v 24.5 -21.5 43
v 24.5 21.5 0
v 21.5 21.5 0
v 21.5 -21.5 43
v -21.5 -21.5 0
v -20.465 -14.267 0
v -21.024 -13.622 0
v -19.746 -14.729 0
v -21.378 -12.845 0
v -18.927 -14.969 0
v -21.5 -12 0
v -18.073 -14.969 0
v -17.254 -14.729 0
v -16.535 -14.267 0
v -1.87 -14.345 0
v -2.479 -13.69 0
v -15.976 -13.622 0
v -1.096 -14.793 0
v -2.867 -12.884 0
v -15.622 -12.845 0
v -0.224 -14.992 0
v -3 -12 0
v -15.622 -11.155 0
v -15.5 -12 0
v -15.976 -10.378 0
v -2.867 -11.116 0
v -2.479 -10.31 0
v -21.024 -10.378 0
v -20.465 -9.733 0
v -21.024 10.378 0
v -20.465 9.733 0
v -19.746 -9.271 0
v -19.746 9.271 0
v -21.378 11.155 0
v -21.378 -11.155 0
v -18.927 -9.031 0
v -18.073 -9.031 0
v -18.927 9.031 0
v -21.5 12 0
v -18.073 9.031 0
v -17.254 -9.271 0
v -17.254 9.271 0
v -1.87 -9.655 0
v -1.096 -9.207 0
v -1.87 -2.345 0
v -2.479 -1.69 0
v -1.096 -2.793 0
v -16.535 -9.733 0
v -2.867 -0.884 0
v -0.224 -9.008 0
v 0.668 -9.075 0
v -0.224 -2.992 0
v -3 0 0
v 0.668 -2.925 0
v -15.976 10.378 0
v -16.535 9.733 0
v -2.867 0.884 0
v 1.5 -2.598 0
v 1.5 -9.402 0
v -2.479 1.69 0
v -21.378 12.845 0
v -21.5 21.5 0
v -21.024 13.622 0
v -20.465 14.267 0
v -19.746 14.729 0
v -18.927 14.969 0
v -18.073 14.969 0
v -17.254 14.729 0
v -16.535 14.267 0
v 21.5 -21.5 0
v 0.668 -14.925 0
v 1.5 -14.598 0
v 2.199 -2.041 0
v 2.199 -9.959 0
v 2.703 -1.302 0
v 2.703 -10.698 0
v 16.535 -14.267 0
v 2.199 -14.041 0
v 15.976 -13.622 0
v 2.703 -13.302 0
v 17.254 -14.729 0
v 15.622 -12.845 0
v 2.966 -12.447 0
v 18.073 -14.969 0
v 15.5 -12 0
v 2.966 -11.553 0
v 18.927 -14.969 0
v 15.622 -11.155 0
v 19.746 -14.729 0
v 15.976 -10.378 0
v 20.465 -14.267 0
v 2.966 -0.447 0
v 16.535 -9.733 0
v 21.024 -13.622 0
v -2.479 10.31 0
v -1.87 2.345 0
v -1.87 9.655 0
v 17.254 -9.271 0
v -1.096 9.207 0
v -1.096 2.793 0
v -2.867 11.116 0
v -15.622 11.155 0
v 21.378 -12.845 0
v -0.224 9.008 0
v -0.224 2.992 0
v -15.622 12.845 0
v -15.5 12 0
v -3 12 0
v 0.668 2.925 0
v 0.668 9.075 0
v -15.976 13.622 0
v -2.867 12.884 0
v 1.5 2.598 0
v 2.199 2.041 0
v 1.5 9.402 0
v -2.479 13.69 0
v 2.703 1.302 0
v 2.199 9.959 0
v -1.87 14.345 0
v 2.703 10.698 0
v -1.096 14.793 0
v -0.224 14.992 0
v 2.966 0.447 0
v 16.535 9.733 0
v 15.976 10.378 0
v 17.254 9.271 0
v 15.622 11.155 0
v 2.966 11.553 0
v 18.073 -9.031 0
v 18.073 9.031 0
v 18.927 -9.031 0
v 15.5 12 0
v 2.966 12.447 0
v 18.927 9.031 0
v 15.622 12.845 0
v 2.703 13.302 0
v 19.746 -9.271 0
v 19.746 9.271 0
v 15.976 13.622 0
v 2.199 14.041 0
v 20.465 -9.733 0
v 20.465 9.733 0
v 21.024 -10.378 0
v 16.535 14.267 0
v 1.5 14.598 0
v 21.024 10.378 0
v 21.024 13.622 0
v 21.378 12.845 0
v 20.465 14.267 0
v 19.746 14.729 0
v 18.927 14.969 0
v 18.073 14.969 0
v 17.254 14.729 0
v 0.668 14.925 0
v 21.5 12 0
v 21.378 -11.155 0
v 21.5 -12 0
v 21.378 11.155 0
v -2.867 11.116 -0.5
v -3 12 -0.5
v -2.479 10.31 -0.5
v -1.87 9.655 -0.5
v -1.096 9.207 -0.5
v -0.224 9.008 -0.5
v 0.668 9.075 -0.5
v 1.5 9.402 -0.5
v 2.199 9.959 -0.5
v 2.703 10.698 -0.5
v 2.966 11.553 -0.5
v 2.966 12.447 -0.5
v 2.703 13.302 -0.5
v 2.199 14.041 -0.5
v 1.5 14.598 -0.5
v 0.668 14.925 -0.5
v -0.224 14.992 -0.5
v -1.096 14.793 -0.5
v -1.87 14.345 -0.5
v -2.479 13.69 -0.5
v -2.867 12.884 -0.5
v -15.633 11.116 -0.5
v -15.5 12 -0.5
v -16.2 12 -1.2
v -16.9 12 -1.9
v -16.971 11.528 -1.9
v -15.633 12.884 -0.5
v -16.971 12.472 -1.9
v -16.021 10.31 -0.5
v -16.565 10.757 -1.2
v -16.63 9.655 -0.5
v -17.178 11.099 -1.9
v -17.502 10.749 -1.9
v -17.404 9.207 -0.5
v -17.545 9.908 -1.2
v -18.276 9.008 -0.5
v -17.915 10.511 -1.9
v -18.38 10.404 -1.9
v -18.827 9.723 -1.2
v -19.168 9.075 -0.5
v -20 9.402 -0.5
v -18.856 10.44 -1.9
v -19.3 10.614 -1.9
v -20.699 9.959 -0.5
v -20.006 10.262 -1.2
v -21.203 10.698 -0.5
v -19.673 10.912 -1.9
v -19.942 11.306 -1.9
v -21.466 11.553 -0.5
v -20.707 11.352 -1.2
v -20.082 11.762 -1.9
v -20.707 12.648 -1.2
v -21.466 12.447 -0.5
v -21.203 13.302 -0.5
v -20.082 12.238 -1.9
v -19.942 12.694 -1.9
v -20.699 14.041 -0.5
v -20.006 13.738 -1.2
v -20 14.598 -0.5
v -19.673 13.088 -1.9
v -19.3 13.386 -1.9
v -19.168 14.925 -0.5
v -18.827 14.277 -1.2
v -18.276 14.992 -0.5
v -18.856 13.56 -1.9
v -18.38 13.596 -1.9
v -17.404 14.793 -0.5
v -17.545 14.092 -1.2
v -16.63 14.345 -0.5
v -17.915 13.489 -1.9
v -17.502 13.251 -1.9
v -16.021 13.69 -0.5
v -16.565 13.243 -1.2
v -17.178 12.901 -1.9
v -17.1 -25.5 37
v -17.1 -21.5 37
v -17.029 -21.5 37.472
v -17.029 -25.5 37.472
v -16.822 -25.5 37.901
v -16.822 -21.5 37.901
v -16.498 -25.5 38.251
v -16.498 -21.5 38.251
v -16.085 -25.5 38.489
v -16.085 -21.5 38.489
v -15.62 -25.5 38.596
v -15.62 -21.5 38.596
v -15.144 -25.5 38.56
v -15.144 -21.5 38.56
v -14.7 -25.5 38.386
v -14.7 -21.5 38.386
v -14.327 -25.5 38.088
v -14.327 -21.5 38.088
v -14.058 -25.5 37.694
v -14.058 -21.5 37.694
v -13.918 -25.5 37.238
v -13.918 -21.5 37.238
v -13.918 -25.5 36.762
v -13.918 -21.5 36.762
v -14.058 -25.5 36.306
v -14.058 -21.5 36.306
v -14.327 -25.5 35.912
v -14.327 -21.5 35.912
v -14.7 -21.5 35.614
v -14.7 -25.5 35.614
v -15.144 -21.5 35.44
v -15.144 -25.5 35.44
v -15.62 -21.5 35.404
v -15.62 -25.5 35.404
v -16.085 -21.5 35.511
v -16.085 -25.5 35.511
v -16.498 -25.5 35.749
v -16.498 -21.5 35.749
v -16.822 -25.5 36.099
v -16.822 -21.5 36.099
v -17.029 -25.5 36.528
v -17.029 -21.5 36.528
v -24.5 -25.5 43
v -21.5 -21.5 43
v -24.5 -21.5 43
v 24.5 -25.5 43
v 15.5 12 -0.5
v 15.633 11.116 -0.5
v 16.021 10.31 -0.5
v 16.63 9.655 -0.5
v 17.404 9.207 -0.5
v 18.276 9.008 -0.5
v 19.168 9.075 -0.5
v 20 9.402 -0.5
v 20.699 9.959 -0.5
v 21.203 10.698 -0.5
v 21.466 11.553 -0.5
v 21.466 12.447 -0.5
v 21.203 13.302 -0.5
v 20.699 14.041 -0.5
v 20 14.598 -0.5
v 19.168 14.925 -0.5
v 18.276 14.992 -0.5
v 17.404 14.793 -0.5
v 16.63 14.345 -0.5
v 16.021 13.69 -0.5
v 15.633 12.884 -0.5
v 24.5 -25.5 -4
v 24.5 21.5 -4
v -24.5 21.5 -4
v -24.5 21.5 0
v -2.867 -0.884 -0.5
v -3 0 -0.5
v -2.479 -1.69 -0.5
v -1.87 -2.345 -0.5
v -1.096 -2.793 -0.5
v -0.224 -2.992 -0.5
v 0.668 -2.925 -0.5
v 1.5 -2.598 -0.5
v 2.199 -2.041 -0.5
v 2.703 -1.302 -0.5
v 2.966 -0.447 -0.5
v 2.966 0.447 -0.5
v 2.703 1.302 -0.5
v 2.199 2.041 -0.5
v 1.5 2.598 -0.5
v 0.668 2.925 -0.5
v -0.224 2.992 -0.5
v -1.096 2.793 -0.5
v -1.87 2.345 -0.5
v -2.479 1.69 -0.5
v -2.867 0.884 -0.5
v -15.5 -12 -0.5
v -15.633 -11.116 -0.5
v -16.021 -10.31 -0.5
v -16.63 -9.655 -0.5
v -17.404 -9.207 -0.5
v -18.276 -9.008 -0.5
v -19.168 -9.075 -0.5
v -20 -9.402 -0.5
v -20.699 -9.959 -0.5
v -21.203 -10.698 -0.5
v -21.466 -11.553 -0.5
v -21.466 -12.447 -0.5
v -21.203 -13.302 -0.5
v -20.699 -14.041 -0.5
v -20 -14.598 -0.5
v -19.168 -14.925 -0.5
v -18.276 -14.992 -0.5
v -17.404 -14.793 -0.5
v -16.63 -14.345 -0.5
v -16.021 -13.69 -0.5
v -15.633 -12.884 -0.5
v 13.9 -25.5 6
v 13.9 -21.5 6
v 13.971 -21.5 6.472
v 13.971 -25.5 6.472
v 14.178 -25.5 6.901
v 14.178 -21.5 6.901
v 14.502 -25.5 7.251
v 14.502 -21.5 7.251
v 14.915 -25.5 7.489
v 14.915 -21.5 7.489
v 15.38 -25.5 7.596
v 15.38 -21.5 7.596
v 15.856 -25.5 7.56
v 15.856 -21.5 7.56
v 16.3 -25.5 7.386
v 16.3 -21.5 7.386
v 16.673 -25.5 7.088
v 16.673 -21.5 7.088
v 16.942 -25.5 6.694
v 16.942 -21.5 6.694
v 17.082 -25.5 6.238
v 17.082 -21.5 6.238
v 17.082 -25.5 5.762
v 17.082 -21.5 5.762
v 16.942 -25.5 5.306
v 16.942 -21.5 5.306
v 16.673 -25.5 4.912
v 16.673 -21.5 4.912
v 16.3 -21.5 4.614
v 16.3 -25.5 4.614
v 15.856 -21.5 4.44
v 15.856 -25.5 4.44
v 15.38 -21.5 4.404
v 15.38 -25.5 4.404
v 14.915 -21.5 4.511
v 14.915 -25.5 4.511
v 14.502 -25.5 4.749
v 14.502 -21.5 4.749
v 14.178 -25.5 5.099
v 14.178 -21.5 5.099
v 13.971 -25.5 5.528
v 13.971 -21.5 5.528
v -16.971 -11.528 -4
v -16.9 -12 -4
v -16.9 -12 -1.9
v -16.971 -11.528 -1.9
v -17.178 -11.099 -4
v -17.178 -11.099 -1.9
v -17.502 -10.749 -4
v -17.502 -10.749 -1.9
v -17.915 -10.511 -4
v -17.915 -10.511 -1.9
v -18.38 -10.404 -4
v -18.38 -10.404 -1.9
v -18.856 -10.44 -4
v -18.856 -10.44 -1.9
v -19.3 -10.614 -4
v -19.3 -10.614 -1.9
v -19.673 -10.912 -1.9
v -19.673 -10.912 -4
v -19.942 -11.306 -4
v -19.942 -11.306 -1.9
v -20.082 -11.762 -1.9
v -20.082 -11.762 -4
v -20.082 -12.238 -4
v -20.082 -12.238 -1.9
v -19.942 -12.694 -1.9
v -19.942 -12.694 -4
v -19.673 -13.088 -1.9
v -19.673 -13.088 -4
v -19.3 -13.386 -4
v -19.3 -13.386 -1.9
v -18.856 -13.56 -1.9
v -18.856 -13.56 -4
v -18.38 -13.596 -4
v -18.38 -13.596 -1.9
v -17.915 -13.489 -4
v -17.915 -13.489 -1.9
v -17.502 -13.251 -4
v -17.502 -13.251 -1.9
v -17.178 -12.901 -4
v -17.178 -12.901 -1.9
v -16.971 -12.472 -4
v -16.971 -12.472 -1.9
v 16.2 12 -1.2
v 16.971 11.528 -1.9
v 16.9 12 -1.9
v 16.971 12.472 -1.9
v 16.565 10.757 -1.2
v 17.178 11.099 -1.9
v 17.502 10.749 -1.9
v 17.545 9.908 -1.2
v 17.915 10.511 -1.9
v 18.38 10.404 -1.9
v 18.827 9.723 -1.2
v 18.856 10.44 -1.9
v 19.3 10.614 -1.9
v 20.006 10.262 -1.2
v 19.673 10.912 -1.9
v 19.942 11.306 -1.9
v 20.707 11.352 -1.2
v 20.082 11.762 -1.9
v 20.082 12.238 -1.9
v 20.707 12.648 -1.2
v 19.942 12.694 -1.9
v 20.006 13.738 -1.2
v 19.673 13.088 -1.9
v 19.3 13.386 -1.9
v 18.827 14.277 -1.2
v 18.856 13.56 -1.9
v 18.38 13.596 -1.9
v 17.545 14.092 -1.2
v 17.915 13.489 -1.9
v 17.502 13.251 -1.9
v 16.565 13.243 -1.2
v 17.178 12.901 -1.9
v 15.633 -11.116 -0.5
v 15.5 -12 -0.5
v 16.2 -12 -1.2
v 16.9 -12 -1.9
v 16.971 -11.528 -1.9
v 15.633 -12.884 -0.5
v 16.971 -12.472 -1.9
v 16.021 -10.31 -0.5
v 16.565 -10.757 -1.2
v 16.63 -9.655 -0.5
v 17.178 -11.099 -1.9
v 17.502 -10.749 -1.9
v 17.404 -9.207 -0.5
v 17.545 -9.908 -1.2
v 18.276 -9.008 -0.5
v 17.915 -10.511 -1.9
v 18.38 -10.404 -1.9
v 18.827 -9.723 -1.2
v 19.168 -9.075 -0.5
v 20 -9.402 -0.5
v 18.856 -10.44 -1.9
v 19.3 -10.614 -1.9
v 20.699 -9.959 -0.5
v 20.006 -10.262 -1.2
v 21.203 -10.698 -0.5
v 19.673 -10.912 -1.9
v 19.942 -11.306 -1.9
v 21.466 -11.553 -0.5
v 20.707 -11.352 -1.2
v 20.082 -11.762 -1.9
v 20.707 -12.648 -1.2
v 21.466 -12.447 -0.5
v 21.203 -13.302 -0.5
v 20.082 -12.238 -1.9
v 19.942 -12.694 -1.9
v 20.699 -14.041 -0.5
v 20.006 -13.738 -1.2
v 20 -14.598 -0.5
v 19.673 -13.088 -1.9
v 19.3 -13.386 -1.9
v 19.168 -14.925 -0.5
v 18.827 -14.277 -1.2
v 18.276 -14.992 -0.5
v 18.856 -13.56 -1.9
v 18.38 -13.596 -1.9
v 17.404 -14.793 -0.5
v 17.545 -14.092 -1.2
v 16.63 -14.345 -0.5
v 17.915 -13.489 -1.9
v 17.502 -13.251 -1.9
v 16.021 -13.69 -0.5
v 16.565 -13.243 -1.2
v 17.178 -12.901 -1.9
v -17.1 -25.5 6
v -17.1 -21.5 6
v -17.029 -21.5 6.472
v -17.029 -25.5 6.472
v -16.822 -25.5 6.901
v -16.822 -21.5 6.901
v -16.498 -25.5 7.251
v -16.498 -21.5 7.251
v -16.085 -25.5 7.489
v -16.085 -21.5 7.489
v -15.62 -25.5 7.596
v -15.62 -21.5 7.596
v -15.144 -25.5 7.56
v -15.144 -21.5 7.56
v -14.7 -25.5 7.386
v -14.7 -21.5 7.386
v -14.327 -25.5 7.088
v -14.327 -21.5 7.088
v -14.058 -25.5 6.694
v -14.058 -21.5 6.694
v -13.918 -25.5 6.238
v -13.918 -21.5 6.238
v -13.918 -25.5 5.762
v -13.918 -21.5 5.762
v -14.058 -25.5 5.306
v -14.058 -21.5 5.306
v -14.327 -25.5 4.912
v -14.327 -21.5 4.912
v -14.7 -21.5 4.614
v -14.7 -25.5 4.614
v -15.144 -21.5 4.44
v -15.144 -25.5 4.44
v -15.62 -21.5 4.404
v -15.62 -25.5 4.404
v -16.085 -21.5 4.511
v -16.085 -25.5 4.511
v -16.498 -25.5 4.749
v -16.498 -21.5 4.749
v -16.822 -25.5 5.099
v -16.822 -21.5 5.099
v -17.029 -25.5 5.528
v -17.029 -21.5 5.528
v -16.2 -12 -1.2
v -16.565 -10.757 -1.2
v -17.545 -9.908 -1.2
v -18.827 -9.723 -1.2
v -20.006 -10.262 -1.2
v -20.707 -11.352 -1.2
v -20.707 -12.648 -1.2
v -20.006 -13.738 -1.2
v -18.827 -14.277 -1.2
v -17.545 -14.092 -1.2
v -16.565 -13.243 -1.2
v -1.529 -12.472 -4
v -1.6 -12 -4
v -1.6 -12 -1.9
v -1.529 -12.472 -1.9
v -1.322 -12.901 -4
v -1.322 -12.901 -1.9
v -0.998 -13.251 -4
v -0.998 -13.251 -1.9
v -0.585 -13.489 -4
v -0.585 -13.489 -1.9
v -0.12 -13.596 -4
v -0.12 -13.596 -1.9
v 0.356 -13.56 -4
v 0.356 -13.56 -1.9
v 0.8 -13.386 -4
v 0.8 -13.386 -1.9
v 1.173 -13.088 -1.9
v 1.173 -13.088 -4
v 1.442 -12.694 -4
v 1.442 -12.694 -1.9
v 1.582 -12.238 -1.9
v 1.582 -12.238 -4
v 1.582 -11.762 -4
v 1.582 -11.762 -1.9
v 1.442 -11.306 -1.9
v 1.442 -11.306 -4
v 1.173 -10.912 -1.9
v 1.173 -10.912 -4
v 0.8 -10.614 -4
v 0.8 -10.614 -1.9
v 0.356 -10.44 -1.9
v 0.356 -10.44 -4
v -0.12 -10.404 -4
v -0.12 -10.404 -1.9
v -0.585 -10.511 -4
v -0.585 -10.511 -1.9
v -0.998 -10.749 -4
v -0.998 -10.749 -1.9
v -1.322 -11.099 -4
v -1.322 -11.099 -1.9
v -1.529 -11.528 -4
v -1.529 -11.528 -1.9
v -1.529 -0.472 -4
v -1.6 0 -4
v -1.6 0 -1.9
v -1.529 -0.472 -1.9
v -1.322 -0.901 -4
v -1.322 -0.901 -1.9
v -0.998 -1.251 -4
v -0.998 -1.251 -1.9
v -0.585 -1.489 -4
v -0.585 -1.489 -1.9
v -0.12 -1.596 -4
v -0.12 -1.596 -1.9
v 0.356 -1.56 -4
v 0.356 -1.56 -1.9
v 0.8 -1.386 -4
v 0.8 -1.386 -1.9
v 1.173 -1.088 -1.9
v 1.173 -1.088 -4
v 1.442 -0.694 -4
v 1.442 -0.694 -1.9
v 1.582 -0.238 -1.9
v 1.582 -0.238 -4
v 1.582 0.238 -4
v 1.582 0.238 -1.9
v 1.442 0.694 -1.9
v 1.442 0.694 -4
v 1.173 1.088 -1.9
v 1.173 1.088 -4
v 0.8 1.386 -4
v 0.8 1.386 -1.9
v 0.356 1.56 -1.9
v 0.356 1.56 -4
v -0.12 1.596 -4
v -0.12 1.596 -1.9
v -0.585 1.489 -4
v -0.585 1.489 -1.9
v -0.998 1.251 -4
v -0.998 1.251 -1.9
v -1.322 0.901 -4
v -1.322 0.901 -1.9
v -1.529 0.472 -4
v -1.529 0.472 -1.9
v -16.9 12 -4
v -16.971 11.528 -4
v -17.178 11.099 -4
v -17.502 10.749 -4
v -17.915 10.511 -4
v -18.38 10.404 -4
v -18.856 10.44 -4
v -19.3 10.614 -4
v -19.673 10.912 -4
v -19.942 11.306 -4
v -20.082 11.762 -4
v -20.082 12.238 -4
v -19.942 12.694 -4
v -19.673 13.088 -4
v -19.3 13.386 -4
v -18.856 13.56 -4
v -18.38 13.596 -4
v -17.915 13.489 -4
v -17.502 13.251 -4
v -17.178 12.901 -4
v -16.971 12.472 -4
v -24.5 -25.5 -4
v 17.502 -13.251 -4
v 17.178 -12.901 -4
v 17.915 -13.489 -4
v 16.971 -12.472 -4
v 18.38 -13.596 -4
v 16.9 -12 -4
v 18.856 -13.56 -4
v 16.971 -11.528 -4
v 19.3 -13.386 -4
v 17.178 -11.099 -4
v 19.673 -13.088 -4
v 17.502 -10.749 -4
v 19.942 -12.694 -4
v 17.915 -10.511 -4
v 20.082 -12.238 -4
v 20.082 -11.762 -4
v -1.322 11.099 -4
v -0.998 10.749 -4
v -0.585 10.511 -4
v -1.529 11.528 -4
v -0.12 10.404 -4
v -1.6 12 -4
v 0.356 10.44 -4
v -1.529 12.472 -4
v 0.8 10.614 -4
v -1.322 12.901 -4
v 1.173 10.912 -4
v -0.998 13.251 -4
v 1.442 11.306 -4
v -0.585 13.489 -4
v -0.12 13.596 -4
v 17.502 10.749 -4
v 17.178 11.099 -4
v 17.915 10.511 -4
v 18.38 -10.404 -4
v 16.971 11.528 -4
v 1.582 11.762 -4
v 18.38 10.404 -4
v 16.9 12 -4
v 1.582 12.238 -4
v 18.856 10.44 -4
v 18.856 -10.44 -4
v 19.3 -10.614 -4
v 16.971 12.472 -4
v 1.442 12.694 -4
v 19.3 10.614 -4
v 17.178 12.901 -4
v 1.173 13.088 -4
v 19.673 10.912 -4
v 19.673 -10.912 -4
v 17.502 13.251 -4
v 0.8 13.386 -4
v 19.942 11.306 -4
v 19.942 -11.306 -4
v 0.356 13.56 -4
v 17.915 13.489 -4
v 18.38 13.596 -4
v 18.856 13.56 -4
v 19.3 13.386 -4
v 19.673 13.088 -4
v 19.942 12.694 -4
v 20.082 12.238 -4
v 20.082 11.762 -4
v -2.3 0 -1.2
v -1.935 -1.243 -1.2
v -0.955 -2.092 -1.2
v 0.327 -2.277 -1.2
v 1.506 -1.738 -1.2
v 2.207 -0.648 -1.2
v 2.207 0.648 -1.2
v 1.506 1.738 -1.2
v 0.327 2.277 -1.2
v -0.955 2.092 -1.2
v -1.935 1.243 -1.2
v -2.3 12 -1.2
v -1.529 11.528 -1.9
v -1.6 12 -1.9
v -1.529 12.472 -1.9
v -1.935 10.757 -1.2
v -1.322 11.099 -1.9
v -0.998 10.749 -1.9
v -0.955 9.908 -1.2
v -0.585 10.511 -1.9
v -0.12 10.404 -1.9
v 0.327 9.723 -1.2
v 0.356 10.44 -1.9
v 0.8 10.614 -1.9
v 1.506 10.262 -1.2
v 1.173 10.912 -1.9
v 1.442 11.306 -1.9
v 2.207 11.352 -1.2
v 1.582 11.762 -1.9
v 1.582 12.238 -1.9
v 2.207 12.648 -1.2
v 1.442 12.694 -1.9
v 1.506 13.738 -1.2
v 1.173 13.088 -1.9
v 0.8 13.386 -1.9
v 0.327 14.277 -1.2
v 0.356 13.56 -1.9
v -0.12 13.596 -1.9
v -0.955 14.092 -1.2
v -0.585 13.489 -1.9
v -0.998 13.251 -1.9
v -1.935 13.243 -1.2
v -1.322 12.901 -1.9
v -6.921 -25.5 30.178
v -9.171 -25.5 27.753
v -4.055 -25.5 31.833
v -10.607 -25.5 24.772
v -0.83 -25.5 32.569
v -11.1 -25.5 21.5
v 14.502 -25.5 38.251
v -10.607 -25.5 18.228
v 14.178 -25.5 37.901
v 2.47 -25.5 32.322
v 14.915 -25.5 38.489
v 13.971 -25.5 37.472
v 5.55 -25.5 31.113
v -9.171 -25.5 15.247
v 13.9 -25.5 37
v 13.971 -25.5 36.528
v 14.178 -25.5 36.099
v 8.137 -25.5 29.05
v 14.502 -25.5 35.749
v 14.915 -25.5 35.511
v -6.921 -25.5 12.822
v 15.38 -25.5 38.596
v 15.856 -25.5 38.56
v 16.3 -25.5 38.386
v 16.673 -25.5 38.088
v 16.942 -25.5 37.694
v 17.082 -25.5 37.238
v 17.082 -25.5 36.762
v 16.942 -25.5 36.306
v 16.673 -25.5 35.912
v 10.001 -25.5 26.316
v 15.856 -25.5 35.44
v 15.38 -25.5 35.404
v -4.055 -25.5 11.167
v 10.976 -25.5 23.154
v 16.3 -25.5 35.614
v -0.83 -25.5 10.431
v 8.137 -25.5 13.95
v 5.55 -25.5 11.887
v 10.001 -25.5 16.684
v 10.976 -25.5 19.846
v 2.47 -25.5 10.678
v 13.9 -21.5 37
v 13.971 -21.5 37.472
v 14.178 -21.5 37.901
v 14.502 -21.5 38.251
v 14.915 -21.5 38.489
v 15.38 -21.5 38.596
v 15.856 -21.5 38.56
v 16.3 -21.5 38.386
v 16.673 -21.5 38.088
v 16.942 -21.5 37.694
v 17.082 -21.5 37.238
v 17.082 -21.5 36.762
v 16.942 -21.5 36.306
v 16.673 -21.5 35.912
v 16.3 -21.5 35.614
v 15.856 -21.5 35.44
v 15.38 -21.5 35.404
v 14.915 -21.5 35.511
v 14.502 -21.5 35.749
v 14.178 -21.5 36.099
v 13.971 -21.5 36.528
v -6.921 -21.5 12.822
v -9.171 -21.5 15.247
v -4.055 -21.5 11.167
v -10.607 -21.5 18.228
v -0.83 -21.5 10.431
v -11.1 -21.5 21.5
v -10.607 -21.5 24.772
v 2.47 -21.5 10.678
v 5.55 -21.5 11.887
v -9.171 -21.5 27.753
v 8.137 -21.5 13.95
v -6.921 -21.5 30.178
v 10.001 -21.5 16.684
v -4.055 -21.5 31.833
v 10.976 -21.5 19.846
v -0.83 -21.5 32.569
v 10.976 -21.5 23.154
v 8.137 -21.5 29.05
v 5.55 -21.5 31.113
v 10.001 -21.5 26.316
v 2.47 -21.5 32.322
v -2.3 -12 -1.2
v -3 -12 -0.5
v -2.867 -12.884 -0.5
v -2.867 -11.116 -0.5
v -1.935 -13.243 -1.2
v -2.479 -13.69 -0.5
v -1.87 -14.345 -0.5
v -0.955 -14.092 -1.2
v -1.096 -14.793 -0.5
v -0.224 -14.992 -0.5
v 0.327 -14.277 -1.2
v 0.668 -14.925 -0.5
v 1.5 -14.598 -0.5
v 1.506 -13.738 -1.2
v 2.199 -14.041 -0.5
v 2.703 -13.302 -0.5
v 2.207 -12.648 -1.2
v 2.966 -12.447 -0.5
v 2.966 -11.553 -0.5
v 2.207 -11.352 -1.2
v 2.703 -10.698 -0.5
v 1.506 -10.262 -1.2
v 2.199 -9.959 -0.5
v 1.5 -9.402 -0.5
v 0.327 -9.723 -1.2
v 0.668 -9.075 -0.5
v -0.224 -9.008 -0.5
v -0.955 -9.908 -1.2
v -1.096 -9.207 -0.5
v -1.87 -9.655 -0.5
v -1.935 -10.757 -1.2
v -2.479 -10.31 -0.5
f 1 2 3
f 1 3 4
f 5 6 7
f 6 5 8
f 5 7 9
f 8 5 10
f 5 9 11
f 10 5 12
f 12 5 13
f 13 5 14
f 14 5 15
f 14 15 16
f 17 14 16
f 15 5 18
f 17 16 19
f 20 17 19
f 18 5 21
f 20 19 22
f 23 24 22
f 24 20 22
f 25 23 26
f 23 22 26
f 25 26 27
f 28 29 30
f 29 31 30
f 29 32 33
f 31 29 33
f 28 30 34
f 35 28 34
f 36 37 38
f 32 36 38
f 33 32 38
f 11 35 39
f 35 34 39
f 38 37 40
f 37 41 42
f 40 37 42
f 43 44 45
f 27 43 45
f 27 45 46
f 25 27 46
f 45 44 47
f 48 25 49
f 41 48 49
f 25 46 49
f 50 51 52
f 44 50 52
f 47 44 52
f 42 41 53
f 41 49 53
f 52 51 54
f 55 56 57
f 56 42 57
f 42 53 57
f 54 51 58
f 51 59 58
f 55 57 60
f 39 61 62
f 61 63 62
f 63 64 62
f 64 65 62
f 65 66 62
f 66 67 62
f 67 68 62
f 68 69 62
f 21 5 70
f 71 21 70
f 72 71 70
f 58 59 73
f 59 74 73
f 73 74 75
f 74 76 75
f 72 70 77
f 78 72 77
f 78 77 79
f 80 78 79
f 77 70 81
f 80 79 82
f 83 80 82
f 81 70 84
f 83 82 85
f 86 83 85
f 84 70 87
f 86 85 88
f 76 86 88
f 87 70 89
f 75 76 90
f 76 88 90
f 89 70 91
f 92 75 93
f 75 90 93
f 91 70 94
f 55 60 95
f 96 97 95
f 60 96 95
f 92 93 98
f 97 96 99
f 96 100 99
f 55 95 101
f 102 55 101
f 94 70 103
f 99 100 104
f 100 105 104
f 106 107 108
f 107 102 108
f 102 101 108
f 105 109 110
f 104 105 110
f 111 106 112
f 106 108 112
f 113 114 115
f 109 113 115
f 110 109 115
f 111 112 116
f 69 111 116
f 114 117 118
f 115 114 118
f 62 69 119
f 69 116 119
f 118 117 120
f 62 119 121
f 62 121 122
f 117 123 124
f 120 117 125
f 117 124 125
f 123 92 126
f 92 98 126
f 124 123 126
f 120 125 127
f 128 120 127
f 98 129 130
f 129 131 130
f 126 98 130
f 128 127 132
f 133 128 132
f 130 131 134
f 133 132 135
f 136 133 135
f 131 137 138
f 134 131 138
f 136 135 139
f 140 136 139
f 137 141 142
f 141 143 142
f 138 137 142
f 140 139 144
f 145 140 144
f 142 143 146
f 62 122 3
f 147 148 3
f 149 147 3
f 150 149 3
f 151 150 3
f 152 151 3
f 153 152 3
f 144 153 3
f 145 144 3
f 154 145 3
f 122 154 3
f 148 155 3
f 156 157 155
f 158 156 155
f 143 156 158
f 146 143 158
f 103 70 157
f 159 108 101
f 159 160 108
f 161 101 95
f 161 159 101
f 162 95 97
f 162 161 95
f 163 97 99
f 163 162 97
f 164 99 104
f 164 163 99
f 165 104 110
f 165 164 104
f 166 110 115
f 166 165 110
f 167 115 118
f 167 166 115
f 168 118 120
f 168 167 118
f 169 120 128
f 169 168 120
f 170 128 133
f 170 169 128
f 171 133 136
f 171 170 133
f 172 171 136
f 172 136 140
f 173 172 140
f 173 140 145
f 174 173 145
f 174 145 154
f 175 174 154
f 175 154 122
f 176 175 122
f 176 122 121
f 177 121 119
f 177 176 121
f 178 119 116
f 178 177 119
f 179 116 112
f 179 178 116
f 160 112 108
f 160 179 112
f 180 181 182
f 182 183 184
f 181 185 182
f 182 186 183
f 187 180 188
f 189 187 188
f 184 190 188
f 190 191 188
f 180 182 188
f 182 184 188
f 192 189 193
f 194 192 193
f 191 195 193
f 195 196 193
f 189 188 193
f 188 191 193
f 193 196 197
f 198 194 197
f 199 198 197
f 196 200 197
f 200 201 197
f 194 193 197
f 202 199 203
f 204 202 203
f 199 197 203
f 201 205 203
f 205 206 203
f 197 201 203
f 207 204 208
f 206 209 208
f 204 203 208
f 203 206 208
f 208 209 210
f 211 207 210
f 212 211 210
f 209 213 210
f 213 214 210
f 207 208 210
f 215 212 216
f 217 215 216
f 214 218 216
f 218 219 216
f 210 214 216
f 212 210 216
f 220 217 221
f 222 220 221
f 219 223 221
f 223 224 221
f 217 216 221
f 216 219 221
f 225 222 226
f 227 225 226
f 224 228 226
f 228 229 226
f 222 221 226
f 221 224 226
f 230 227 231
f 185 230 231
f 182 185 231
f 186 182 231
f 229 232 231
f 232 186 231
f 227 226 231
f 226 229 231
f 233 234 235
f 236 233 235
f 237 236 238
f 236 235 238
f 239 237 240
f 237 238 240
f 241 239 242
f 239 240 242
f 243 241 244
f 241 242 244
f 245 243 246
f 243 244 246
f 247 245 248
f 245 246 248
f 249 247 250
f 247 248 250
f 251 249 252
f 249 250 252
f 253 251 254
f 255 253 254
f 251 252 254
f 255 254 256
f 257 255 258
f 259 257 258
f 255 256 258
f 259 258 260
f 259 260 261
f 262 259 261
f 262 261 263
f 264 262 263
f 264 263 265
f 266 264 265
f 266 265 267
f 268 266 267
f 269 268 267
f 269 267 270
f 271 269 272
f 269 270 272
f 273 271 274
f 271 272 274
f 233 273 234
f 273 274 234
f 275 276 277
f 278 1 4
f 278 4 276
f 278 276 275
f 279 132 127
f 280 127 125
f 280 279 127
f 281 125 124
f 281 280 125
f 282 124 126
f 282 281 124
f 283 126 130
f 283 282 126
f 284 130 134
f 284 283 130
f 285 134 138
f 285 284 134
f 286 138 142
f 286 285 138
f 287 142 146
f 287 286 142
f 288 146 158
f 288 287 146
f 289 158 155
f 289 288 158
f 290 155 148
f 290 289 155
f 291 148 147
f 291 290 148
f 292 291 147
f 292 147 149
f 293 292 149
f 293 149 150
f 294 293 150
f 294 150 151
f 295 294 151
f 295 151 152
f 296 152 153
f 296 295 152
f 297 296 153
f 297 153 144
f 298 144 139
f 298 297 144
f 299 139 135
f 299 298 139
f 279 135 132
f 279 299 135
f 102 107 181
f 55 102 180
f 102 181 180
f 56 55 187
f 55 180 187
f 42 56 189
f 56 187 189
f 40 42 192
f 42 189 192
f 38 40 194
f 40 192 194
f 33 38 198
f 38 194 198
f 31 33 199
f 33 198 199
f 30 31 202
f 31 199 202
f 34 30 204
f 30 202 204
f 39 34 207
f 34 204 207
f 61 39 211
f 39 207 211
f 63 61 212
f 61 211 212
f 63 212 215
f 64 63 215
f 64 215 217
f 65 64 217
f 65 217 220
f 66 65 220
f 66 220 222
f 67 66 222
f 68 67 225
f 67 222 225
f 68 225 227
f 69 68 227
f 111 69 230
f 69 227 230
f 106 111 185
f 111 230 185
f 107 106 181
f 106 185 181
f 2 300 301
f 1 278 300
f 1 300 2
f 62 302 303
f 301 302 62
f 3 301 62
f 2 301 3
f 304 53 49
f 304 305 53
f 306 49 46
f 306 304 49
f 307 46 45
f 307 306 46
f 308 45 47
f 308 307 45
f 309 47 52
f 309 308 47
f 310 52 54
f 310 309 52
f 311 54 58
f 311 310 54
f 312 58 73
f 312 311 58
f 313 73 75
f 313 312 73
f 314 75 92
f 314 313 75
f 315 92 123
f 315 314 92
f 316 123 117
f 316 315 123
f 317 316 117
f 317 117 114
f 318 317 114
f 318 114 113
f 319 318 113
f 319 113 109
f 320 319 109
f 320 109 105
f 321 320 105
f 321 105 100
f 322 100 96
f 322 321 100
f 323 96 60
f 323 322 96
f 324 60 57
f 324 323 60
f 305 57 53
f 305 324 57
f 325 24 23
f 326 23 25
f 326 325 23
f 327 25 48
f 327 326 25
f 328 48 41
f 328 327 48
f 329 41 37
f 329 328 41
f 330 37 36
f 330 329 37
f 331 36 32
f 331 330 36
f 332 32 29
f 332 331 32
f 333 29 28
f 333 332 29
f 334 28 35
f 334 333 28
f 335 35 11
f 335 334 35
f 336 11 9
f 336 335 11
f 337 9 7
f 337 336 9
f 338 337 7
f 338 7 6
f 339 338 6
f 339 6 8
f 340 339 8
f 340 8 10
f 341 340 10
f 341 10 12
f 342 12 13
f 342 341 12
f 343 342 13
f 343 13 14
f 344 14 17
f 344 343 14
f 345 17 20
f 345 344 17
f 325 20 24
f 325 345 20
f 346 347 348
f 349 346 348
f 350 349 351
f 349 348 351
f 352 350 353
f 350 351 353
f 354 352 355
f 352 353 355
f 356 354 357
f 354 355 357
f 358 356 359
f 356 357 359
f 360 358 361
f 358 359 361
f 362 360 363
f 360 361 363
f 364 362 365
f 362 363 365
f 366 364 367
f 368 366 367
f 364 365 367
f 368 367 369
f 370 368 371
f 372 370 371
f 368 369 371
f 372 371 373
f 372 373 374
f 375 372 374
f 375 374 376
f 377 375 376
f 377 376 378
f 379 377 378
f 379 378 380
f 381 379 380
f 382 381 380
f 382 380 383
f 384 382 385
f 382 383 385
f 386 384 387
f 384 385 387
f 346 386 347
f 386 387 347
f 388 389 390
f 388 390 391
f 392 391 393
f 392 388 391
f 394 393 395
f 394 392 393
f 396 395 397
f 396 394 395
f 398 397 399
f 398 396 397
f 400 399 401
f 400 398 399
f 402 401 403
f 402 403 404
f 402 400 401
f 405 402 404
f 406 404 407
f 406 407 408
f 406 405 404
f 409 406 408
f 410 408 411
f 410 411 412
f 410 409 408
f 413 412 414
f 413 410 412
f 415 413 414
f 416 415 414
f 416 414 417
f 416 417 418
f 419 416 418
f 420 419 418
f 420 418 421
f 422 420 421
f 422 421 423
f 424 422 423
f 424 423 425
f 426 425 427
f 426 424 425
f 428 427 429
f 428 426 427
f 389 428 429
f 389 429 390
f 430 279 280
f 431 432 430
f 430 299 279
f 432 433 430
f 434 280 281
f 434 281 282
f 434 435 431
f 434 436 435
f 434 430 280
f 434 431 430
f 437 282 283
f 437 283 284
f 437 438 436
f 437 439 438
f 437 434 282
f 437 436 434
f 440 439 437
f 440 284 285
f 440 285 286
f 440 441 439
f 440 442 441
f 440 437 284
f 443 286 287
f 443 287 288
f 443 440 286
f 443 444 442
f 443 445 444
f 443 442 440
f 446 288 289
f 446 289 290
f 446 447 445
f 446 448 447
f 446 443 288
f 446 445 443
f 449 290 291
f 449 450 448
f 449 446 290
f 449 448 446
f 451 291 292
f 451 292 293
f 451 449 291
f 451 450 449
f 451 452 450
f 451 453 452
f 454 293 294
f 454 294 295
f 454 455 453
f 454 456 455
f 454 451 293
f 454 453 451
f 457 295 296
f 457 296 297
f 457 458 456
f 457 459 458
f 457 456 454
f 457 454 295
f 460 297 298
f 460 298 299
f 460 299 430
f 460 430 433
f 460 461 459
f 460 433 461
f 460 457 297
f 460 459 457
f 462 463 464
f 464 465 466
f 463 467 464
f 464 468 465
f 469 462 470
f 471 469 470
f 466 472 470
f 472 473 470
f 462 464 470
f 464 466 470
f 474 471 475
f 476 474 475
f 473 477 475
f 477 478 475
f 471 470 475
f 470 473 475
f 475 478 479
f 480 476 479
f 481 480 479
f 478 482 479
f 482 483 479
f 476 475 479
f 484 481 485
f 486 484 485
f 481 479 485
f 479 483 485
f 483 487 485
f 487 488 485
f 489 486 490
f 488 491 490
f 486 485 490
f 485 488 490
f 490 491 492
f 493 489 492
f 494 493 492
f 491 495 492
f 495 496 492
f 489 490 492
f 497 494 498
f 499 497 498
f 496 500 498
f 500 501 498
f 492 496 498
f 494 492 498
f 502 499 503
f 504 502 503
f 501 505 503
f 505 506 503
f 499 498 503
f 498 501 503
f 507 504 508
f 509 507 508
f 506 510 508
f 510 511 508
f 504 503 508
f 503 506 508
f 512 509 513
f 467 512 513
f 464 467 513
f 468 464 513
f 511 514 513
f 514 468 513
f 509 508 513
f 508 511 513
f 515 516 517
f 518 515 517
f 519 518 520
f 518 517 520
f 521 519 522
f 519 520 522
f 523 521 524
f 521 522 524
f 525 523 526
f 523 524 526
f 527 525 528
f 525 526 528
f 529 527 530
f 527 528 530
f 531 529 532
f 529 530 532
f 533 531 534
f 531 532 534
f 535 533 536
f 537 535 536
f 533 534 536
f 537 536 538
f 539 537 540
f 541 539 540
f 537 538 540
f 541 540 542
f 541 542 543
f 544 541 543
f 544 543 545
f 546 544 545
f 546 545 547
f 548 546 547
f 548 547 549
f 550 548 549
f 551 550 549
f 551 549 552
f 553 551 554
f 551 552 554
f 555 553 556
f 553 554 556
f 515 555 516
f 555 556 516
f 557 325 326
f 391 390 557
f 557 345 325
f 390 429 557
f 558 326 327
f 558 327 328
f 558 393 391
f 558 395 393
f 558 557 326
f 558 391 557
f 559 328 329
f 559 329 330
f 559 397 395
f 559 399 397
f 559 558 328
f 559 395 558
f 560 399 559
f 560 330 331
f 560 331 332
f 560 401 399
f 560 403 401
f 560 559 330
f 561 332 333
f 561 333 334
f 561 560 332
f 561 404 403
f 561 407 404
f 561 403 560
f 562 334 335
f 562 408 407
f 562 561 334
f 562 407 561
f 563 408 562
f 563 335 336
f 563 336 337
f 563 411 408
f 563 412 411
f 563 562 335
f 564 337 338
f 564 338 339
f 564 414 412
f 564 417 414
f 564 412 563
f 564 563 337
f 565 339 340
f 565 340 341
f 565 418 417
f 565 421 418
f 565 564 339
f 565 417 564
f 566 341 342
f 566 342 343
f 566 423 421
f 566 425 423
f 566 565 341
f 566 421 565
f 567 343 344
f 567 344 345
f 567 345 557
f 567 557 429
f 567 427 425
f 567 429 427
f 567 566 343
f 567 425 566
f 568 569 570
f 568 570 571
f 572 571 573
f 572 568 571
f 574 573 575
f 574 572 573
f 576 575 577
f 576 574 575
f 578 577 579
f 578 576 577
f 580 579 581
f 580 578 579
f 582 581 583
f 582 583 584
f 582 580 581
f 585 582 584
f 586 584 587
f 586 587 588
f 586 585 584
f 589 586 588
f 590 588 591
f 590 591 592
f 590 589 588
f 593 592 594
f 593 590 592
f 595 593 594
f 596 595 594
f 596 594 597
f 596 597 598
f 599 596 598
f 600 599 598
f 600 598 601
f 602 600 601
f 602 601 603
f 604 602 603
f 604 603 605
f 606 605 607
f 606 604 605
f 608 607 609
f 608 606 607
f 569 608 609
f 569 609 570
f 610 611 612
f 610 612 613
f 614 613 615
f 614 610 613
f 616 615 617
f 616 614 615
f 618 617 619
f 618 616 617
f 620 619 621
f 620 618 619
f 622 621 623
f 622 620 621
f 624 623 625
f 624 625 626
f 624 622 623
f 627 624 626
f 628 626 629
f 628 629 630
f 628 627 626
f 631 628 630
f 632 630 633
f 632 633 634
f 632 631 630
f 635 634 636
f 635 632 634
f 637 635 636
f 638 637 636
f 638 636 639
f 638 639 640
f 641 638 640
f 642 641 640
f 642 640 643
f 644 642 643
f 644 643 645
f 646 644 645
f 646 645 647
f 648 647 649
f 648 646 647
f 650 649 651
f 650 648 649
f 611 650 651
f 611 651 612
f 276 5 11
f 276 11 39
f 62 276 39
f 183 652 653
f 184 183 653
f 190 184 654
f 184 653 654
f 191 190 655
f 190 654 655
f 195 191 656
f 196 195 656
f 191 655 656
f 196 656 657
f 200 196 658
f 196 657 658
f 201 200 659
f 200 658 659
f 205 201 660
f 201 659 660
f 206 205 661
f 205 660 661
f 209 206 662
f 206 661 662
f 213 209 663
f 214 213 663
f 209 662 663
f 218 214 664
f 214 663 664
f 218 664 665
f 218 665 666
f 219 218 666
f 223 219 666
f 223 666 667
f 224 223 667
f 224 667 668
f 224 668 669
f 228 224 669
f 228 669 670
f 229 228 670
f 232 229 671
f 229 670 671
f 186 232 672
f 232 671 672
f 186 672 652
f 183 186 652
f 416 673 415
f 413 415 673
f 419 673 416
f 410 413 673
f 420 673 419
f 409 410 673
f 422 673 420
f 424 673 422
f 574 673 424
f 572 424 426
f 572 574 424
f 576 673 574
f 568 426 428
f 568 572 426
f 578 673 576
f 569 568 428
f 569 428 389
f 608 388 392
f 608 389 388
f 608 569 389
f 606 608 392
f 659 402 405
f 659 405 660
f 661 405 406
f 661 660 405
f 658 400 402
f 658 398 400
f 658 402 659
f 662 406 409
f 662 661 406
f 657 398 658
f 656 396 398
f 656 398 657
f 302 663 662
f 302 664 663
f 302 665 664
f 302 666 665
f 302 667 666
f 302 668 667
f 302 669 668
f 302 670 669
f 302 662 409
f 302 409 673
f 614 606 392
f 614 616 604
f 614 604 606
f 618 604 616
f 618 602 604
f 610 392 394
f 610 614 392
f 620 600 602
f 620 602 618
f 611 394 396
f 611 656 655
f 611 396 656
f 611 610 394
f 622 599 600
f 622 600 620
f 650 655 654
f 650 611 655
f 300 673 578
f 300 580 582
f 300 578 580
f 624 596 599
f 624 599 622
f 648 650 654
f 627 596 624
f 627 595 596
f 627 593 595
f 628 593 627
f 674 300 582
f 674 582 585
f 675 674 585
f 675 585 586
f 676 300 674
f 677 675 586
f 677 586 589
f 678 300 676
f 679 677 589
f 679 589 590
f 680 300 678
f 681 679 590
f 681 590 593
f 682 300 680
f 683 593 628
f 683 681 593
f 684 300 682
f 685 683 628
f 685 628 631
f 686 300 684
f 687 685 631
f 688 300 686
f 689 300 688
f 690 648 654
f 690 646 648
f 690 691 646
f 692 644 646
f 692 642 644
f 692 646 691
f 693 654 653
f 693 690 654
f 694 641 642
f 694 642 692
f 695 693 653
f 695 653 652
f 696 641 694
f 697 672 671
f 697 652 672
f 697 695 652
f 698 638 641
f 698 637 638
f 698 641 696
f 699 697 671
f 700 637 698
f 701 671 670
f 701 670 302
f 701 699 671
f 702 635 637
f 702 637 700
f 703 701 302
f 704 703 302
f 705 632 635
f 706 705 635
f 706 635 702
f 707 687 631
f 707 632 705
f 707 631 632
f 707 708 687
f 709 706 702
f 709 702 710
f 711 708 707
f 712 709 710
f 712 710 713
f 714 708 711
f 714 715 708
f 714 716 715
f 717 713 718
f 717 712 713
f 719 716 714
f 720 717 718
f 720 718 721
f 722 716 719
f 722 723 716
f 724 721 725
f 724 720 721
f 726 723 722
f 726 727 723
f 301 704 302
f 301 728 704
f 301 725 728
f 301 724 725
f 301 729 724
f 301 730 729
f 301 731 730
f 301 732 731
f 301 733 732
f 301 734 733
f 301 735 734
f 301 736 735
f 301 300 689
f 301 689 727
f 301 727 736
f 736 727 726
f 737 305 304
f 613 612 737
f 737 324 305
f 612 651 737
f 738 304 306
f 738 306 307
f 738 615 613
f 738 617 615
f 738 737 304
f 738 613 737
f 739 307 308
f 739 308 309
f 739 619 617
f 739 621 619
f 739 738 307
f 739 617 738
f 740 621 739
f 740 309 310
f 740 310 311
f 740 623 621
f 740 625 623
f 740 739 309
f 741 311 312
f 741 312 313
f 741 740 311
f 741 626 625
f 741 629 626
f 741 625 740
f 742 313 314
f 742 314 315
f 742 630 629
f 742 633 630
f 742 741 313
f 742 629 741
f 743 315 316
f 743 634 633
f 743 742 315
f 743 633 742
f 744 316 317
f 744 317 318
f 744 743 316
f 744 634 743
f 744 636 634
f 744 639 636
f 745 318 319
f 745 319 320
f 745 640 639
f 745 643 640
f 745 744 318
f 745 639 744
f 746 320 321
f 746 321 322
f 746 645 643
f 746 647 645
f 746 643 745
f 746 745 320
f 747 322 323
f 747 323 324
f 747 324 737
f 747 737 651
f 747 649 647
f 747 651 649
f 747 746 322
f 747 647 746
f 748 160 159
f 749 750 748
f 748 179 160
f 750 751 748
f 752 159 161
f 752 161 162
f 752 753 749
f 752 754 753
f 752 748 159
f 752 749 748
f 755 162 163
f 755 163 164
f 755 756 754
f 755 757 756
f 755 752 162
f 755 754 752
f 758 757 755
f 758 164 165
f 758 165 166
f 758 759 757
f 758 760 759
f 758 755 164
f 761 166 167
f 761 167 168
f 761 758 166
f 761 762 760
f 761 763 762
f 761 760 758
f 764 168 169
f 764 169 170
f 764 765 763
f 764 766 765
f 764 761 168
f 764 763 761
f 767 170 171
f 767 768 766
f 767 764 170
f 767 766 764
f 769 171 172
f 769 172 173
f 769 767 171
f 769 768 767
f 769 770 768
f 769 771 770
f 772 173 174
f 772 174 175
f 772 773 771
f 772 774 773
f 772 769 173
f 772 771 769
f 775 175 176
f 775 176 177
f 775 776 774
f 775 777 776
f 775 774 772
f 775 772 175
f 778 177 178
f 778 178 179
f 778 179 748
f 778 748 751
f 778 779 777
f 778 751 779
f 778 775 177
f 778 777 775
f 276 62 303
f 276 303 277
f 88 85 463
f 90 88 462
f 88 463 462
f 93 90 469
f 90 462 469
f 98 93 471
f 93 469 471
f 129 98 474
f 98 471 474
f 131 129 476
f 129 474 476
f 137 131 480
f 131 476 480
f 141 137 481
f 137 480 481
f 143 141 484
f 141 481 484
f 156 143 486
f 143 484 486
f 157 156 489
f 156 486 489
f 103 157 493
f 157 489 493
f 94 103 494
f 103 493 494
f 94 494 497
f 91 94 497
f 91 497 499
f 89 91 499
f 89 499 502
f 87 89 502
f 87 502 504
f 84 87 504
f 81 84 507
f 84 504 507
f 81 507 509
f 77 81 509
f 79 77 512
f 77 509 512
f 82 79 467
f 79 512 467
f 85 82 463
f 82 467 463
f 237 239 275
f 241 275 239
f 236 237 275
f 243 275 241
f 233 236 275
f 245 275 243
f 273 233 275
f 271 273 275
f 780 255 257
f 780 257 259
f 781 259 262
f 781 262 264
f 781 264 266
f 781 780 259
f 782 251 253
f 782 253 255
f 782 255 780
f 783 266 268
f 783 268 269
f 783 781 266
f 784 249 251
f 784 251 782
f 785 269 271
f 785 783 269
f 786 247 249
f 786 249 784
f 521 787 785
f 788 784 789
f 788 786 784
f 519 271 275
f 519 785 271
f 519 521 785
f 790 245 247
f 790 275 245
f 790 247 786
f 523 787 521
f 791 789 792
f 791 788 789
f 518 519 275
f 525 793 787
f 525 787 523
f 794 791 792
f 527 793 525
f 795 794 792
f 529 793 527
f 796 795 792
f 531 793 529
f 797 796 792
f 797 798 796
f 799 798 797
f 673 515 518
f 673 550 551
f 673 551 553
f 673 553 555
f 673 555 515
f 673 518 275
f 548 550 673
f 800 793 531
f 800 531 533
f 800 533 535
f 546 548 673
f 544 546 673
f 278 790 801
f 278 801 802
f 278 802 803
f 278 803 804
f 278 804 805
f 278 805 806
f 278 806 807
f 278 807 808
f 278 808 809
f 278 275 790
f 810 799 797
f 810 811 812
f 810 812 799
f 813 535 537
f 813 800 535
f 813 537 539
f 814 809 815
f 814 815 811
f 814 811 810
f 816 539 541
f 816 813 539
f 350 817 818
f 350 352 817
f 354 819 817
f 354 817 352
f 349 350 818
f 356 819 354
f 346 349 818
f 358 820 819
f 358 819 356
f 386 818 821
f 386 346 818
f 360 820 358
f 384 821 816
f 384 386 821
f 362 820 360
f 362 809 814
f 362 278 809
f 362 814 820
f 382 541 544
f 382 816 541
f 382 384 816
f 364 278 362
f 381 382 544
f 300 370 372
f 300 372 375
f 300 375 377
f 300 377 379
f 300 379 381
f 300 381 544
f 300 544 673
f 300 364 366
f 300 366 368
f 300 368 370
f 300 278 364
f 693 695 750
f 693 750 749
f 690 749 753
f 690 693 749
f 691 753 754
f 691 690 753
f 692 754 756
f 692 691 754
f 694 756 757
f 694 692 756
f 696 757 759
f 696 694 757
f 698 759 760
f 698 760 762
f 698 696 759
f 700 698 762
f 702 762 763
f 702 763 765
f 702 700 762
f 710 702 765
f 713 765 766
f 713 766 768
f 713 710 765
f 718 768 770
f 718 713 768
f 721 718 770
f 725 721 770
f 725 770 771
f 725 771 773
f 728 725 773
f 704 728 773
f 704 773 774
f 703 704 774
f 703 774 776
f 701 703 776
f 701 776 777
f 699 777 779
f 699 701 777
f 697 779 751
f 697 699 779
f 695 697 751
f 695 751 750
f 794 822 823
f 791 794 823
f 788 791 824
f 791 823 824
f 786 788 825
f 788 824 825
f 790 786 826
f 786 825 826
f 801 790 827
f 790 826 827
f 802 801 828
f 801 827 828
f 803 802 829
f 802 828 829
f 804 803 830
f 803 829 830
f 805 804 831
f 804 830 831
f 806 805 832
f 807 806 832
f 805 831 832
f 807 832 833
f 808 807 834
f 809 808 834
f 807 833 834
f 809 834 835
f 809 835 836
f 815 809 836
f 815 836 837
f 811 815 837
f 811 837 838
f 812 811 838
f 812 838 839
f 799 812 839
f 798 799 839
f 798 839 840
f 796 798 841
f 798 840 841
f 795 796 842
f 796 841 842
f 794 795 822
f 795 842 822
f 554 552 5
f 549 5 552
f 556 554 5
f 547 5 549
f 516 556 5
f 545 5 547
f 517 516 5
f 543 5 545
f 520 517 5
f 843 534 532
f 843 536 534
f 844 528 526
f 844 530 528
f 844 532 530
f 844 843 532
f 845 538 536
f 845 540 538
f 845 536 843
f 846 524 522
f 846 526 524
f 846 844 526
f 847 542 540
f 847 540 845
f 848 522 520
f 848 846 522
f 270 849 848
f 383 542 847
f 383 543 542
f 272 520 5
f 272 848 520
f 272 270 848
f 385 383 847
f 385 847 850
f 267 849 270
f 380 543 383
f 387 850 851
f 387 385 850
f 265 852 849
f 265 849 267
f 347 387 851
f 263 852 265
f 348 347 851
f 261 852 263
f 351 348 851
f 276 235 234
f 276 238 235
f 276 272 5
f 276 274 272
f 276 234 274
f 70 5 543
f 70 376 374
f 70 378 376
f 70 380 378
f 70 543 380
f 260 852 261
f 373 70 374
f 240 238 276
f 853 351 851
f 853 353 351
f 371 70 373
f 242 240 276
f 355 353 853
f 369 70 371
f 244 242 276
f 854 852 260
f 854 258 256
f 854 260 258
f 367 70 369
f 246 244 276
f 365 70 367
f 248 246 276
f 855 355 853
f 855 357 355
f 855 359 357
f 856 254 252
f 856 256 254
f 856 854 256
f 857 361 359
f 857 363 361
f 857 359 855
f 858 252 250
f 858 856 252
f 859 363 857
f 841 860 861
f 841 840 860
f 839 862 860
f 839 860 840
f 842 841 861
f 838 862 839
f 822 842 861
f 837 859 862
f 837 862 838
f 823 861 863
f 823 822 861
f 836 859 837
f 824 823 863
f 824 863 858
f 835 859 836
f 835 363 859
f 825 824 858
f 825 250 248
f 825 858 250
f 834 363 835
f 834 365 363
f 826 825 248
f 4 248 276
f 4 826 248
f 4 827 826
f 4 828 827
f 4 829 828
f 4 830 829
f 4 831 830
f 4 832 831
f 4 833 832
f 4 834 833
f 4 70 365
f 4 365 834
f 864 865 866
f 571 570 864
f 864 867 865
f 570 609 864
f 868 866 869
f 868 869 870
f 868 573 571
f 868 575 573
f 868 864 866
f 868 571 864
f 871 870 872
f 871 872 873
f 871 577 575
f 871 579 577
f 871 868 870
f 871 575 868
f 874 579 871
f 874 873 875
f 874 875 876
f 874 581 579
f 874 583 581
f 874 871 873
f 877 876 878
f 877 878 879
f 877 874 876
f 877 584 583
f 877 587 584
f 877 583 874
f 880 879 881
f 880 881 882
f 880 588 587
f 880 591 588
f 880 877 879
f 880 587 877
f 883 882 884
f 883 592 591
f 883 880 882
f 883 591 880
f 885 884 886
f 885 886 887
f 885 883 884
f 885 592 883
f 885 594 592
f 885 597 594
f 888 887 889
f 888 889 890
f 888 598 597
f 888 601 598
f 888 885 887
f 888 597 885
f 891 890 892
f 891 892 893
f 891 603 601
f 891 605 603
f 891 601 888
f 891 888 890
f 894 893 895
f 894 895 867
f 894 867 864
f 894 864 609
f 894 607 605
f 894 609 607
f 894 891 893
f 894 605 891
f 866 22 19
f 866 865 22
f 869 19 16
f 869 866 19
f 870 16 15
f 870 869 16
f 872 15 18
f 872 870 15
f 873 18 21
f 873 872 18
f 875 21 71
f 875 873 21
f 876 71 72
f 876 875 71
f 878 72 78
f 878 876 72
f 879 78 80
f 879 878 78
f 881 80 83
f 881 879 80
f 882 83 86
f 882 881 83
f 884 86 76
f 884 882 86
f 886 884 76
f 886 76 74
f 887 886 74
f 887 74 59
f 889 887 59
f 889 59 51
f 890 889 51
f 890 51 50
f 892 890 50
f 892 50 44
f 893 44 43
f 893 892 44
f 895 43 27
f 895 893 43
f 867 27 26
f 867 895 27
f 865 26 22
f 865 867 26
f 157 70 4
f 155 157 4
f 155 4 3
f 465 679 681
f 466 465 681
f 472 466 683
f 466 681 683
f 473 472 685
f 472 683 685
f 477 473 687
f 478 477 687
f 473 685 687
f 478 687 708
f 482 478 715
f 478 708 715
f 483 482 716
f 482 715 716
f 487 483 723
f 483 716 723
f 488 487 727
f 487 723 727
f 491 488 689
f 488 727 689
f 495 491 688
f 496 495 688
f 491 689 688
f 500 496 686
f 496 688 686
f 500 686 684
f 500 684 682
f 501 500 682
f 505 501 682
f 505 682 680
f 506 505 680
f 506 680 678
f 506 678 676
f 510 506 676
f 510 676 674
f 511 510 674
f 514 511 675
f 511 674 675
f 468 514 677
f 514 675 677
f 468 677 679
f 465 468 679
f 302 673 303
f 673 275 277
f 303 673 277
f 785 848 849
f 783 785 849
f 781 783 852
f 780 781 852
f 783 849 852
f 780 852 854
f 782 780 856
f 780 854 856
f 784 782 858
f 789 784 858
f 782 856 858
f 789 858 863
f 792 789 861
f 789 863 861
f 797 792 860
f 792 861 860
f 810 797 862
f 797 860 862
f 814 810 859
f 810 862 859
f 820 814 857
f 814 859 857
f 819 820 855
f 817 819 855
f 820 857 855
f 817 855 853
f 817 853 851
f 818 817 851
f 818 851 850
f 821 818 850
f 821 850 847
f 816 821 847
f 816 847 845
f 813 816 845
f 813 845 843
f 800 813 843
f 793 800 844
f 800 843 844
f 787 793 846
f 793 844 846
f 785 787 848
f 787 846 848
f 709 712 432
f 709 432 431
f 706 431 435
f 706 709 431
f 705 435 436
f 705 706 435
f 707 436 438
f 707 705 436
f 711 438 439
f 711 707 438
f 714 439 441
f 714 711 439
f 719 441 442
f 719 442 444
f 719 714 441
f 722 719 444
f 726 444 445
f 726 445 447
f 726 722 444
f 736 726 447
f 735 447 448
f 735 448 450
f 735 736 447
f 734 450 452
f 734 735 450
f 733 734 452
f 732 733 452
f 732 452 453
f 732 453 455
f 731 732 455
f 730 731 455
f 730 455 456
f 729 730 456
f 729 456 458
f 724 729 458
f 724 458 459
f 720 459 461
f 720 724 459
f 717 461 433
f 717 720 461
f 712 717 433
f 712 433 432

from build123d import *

# Parameters (mm, degrees)
F2_DEPTH = 24.5
F0_W     = 43
F0_H     = 43
F3_DEPTH = 21.5
F5_R     = 11.1
F5_R_2   = 1.6
F6_DEPTH = 4


# Not quite as in the source:
# - a feature of the source that left no trace in its solid (it failed there, or was rolled back) is left out


with BuildPart() as f2:
    # F1 (on Right) → F2 (new body, symmetric)
    with BuildSketch(Plane.YZ):
        Polygon((21.5, 0), (-21.5, 43), (-25.5, 43), (-25.5, -4), (21.5, -4), align=None)
    extrude(amount=F2_DEPTH, both=True)

    # F0 (on Right) → F3 (cut, symmetric)
    with BuildSketch(Plane.YZ):
        with Locations((0, 21.5)):
            Rectangle(F0_W, F0_H)
    extrude(amount=F3_DEPTH, both=True, mode=Mode.SUBTRACT)

    # F5 (on face) → F6 (cut, through all)
    with BuildSketch(Plane(origin=(0, -21.5, 0), x_dir=(-1, 0, 0), z_dir=(0, 1, 0))):
        with Locations((0, 21.5)):
            Circle(F5_R)
        with Locations((15.5, 37)):
            Circle(F5_R_2)
        with Locations((-15.5, 37)):
            Circle(F5_R_2)
        with Locations((-15.5, 6)):
            Circle(F5_R_2)
        with Locations((15.5, 6)):
            Circle(F5_R_2)
    extrude(amount=-F6_DEPTH, mode=Mode.SUBTRACT)


with BuildPart() as f7:
    # F13 (on Front) → F7 (revolve)
    with BuildSketch(Plane.XZ):
        Polygon((0, -7.6705187887), (0, 0), (-3, 0), (-3, -0.5), (-1.6, -1.9), (-1.6, -7.6705187887), align=None)
    revolve(axis=Axis((0, 0, -3.8352593944), (0, 0, 1)))


with BuildPart() as f14_1:
    # F14: copy of F7
    add(f7.part.moved(Location((0, 12, 0))))


with BuildPart() as f8_1:
    # F8: copy of F7
    add(f7.part.moved(Location((0, -12, 0))))


with BuildPart() as f9_1:
    # F9: copy of F14_1
    add(f14_1.part.moved(Location((18.5, 0, 0))))


with BuildPart() as f10_1:
    # F10: instance of F9_1
    add(f9_1.part.mirror(Plane.YZ))


with BuildPart() as f15_1:
    # F15: instance of F9_1
    add(f9_1.part.mirror(Plane.XZ))


with BuildPart() as f15_2:
    # F15: instance of F10_1
    add(f10_1.part.mirror(Plane.XZ))


with BuildPart() as f2_1:
    add(f2.part)

    # F11: cut F15_1, F8_1, F15_2, F9_1, F14_1, F10_1, F7
    add(f15_1.part, mode=Mode.SUBTRACT)
    add(f8_1.part, mode=Mode.SUBTRACT)
    add(f15_2.part, mode=Mode.SUBTRACT)
    add(f9_1.part, mode=Mode.SUBTRACT)
    add(f14_1.part, mode=Mode.SUBTRACT)
    add(f10_1.part, mode=Mode.SUBTRACT)
    add(f7.part, mode=Mode.SUBTRACT)


solid = f2_1.part
